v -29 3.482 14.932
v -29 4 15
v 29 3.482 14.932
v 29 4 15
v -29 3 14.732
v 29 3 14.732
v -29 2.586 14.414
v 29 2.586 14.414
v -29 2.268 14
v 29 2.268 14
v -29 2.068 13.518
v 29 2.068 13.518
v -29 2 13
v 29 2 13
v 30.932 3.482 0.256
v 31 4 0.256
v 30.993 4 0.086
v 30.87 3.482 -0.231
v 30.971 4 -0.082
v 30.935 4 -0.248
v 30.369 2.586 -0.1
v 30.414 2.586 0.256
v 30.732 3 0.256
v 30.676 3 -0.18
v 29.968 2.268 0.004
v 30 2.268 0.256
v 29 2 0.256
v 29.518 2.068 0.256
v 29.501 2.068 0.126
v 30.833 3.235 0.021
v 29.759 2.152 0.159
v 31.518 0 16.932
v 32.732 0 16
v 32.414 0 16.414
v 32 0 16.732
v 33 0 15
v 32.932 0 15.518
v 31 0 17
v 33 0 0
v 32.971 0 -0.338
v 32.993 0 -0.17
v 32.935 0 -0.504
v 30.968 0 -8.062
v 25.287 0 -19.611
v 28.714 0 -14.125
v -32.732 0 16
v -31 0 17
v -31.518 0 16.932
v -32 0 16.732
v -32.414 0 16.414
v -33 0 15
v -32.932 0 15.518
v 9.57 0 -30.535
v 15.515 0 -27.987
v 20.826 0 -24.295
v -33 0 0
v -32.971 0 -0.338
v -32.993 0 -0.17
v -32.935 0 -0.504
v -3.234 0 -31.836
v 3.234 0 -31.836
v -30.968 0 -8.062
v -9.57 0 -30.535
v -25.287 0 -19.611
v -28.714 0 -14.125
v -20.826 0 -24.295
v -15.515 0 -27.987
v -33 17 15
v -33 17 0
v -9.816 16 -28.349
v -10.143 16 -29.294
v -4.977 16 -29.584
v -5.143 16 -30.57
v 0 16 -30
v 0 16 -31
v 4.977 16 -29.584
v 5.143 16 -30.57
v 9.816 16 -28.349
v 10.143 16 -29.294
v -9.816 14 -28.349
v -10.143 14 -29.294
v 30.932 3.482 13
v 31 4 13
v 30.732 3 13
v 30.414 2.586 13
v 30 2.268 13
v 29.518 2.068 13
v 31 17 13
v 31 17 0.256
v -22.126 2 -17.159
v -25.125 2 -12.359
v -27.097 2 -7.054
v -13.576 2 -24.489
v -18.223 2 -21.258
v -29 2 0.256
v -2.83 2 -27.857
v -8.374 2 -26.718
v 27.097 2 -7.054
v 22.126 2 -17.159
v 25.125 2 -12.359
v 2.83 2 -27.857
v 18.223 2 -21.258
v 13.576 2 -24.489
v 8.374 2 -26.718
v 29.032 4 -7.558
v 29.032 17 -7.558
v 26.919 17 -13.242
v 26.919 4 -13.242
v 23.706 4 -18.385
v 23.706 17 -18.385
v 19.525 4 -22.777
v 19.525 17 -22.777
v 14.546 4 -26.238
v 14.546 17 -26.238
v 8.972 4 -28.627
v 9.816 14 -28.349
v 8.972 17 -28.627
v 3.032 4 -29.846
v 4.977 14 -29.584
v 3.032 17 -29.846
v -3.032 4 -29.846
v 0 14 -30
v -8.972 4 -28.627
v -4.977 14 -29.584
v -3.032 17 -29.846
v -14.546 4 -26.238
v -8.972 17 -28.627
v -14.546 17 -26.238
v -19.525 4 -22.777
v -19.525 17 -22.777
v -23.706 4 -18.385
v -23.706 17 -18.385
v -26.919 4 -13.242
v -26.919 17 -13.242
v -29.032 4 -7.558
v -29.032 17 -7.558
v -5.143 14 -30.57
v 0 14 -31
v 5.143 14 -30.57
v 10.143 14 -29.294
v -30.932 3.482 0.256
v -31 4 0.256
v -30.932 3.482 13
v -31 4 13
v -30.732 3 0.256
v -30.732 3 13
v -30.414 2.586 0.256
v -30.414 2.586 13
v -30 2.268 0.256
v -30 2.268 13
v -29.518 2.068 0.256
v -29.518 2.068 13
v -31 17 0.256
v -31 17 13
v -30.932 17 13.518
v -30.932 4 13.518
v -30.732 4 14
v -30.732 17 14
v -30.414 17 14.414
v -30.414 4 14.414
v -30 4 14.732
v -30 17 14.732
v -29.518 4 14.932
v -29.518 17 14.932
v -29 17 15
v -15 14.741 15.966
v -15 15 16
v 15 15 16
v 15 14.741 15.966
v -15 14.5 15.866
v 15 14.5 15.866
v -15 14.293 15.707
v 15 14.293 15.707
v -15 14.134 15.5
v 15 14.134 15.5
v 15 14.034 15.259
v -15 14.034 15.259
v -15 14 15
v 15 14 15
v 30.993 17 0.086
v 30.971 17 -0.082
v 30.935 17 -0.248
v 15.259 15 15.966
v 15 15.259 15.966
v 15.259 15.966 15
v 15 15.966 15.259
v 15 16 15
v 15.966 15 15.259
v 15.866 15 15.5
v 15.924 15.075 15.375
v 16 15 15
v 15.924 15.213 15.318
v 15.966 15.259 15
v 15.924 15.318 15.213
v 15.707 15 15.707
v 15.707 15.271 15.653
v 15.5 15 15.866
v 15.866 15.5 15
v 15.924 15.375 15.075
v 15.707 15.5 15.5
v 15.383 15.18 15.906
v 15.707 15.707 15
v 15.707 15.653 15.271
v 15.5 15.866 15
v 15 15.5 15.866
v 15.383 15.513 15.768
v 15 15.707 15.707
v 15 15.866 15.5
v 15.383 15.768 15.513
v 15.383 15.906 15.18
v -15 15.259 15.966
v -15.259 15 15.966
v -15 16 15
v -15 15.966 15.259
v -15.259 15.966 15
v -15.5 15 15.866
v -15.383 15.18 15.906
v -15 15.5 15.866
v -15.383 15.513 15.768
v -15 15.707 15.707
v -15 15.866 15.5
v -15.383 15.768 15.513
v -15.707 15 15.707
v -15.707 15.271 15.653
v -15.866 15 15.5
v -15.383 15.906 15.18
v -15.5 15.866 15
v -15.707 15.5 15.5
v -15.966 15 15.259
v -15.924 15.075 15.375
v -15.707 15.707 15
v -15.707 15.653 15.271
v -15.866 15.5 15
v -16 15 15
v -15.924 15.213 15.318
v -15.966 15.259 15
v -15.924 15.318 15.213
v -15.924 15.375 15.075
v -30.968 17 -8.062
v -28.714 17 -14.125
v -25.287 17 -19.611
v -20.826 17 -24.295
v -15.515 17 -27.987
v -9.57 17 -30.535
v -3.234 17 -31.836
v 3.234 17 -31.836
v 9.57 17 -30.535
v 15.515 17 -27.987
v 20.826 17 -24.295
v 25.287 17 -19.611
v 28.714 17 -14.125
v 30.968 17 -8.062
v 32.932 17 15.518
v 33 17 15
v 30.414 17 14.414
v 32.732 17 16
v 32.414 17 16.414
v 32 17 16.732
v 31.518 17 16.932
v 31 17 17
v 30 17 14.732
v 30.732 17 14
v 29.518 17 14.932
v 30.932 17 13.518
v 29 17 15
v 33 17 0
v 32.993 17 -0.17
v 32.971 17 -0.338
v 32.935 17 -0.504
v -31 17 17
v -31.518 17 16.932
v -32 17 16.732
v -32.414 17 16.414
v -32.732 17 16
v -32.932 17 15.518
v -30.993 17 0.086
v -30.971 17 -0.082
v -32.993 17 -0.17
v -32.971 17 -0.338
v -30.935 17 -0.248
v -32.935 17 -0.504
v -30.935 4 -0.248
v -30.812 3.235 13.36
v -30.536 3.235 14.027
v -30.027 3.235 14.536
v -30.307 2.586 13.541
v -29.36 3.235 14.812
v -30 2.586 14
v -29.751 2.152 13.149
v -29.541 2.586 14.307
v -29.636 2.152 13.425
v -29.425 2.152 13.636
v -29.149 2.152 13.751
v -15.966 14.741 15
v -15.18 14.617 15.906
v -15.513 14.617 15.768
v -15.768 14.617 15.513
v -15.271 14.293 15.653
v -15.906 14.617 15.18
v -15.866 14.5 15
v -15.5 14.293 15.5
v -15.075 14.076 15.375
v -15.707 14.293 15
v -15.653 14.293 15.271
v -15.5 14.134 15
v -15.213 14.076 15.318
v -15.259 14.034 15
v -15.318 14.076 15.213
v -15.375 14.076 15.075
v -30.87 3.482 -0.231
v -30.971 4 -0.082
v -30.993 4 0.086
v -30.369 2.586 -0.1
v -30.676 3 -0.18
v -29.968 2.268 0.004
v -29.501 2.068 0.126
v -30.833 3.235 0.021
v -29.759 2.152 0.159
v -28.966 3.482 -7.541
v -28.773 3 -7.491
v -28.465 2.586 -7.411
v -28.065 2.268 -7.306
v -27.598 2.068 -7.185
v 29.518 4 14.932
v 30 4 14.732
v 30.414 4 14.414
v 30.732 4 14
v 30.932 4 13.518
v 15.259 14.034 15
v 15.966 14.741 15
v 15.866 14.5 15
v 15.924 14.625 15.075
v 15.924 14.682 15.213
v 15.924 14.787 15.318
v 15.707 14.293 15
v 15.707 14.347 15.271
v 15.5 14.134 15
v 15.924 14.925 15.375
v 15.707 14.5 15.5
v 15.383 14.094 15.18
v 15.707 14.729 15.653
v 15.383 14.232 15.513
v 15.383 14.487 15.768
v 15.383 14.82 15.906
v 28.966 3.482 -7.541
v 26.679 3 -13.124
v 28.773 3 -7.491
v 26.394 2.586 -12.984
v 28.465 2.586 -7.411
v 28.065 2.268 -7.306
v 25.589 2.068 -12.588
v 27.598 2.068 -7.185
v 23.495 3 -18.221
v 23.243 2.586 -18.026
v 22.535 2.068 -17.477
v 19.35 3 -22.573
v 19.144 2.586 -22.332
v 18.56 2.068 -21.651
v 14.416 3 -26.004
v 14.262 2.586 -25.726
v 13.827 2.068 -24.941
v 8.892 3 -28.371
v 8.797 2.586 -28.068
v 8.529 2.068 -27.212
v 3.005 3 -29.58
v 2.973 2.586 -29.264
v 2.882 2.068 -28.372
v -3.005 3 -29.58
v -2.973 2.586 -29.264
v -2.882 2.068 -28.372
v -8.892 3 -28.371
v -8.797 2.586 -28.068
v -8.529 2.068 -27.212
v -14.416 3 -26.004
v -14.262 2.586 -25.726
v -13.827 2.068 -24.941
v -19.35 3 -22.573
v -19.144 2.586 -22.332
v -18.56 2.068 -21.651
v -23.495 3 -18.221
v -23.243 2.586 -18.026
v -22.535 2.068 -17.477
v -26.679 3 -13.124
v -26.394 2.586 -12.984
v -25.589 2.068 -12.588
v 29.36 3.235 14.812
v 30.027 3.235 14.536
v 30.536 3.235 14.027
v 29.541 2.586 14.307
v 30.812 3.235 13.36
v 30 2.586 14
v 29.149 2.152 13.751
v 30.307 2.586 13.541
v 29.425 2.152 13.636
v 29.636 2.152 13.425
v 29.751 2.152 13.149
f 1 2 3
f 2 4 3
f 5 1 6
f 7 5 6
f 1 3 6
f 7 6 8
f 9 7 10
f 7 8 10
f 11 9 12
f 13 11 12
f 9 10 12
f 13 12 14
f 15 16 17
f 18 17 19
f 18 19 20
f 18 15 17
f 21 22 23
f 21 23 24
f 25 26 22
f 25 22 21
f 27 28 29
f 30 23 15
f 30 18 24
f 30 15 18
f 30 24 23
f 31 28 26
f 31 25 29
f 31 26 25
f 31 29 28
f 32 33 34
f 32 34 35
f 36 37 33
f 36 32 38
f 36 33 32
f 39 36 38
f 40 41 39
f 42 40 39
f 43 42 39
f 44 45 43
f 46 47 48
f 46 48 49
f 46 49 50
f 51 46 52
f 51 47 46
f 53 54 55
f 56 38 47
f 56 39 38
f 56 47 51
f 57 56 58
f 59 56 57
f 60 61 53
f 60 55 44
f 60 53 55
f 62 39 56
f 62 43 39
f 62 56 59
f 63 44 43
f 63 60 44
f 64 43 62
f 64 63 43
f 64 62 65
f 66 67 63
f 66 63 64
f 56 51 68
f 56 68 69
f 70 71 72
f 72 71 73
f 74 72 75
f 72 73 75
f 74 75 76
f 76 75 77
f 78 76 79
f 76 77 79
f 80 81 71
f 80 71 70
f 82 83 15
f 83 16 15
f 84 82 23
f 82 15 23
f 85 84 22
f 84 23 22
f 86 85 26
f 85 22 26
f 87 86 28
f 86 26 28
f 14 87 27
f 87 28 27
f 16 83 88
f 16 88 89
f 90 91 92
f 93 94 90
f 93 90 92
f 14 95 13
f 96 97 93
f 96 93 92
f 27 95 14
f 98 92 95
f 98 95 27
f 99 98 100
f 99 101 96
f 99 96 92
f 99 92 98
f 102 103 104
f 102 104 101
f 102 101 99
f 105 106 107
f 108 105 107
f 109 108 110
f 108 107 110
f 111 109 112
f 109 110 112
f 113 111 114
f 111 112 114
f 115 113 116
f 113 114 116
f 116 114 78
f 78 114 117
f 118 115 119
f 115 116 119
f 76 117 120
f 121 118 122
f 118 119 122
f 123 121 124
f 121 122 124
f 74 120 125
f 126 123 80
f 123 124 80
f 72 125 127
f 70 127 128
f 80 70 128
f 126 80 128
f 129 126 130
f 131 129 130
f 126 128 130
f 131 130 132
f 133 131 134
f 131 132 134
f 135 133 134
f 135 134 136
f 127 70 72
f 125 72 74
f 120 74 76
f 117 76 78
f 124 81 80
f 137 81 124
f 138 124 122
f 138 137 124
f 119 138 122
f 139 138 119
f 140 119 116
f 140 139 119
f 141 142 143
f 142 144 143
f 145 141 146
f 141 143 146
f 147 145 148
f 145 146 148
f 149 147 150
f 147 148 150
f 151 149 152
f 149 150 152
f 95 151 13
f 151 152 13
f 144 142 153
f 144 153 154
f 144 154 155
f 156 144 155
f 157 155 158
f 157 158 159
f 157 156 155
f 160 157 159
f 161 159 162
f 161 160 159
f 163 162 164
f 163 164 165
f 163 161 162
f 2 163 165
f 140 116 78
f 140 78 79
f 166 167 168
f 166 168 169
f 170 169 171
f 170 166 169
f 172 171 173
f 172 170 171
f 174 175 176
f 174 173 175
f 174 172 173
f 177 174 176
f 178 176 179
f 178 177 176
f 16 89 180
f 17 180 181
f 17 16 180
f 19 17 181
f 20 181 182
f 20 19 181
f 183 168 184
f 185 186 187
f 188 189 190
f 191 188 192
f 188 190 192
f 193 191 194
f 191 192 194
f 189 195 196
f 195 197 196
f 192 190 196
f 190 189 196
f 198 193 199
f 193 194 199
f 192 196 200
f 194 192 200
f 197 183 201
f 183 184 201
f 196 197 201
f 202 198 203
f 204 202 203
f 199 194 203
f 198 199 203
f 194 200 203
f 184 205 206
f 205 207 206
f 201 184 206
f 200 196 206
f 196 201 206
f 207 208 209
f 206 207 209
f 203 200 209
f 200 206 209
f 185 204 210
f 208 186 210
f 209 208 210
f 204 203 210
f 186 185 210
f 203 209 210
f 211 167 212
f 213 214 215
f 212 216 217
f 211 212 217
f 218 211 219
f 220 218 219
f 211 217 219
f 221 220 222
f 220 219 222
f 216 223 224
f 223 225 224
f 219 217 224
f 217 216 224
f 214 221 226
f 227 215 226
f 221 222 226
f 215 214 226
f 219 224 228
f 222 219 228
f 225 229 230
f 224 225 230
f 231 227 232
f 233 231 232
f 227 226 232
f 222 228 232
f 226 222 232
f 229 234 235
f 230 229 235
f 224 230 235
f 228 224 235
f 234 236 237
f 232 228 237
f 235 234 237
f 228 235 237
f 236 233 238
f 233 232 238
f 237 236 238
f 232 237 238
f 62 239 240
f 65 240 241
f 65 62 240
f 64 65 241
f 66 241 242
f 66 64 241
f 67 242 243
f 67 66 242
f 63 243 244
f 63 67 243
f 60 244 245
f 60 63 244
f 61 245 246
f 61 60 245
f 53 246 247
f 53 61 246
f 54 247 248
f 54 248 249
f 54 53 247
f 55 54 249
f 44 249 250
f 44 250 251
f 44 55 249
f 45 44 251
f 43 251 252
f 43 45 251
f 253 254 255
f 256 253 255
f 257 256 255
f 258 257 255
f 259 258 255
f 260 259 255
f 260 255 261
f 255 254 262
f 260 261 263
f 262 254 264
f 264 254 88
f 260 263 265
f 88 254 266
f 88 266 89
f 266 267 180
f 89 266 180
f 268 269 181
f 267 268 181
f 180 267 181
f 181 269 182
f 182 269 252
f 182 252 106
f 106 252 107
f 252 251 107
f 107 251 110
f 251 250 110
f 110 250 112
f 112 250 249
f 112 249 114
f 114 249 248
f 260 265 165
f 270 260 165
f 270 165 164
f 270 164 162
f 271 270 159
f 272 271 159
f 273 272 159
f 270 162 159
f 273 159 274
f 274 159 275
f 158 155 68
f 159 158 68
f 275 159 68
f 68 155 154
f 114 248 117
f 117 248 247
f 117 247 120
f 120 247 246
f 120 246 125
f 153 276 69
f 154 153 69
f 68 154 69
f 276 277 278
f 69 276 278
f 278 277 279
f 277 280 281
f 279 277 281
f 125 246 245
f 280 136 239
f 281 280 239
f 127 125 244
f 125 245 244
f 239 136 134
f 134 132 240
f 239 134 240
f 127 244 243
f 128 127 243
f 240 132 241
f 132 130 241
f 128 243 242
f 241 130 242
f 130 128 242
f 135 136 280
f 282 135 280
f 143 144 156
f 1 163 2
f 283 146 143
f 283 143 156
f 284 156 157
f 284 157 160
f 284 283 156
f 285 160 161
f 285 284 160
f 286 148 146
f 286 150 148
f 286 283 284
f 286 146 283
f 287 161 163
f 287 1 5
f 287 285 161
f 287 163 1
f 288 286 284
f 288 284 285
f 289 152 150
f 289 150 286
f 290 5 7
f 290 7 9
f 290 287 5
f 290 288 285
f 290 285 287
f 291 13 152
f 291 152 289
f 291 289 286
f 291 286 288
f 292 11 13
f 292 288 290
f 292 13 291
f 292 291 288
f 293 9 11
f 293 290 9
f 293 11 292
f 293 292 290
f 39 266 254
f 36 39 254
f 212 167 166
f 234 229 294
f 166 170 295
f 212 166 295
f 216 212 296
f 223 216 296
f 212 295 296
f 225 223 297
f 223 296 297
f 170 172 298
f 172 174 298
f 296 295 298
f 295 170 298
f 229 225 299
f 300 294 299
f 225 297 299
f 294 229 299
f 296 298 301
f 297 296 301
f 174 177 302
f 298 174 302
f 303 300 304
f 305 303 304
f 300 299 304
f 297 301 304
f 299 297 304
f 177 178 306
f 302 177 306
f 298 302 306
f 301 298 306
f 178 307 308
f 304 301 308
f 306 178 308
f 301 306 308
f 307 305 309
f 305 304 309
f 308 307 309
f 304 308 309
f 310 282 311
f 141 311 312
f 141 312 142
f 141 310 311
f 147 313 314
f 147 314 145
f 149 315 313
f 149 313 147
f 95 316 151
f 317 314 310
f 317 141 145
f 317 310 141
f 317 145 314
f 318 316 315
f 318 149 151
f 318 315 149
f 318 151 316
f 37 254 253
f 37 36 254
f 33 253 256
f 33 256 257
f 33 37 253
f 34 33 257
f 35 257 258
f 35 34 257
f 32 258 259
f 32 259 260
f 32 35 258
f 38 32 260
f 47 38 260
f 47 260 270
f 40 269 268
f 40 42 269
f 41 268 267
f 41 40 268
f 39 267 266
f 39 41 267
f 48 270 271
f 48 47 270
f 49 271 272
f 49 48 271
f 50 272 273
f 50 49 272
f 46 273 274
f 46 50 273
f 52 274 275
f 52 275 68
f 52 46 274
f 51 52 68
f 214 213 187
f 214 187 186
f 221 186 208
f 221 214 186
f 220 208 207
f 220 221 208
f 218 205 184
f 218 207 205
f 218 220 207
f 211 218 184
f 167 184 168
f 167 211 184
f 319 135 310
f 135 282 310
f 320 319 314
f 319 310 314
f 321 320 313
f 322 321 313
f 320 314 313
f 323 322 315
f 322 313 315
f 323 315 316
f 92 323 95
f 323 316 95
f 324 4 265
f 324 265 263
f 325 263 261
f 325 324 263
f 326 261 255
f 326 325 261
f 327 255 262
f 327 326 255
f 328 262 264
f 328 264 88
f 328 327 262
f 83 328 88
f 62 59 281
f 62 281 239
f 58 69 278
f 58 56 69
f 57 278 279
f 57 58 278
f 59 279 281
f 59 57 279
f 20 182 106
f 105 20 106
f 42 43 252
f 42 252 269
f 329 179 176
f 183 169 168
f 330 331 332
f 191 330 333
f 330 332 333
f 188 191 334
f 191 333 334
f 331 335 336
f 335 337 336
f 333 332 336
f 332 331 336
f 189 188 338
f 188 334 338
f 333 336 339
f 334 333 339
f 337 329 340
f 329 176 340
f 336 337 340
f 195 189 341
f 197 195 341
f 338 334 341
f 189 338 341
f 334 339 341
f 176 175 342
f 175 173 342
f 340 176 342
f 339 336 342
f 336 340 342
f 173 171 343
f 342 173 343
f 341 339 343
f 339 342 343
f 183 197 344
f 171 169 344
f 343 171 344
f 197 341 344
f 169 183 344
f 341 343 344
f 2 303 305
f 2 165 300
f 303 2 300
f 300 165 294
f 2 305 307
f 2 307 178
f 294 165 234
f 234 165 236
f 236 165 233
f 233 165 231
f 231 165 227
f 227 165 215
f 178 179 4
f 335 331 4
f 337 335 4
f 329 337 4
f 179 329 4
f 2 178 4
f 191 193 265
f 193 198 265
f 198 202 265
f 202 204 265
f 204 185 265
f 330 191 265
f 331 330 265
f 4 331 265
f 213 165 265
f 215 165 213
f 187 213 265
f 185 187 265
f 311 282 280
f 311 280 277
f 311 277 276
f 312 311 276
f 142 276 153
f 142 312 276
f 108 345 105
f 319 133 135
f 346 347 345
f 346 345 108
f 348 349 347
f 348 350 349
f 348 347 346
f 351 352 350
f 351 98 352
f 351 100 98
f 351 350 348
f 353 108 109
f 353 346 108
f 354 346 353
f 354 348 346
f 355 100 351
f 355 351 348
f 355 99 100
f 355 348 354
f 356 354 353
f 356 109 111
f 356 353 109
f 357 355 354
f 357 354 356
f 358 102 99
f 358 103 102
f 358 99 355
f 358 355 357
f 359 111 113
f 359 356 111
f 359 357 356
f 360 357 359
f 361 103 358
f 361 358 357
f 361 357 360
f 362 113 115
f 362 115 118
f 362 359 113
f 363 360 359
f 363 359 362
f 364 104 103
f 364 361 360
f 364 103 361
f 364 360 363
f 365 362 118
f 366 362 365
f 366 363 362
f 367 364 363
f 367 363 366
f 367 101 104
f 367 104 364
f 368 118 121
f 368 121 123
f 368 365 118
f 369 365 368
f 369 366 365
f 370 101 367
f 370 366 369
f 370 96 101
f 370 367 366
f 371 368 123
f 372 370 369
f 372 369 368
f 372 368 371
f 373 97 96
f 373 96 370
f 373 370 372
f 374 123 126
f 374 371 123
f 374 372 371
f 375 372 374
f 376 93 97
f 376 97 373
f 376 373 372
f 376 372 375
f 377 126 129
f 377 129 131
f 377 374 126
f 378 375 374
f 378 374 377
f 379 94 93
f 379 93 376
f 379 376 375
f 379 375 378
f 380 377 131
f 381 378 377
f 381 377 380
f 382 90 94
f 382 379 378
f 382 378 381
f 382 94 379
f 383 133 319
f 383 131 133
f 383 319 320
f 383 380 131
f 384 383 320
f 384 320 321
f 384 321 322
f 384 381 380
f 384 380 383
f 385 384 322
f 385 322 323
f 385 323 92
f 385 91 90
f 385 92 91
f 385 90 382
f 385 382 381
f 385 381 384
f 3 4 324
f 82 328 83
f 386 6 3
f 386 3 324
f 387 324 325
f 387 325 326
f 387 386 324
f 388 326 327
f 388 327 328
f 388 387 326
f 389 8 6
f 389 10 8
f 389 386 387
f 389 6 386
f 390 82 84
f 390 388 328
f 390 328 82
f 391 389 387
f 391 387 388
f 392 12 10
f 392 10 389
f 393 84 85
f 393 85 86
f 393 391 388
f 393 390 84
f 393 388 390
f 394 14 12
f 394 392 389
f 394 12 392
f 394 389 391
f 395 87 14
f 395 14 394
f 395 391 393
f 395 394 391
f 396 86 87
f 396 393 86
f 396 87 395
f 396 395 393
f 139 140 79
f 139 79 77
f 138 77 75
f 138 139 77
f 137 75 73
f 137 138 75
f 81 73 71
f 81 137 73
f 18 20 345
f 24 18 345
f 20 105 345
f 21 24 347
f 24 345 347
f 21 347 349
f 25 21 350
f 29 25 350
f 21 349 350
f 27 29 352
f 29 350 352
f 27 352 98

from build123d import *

# Parameters (mm, degrees)
BOSS_EXTRUDE1_DEPTH = 17
SKETCH4_OUTSIDE_W   = 84.788
SKETCH4_OUTSIDE_H   = 67.788
CUT_EXTRUDE1_DEPTH  = 15
FILLET4_R           = 2
FILLET5_R           = 2
SKETCH9_W           = 32
SKETCH9_H           = 2
CUT_EXTRUDE2_DEPTH  = 1
FILLET6_R           = 1
WRAP5_START         = 14
WRAP5_DEPTH         = 2


# Read off the part's stored shape, not the designer's step: Wrap5
with BuildPart() as part:
    # Sketch2 → Boss-Extrude1 (new body)
    with BuildSketch(Plane(origin=(0, 0, 0), x_dir=(1, 0, 0), z_dir=(0, 1, 0))):
        with BuildLine():
            Line((30.967741935, 8.062193214), (33, 0.25607376))
            Line((33, 0.25607376), (33, -17))
            Line((33, -17), (-33, -17))
            Line((-33, -17), (-33, 0.25607376))
            Line((-33, 0.25607376), (-30.967741935, 8.062193214))
            ThreePointArc((-30.967741935, 8.062193214), (0, 32), (30.967741935, 8.062193214))
        make_face()
    extrude(amount=BOSS_EXTRUDE1_DEPTH)

    # Sketch4 outside → Cut-Extrude1 (cut)
    # profile 1 of 2: a face of its own
    with BuildSketch(Plane(origin=(0, 17, 0), x_dir=(1, 0, 0), z_dir=(0, 1, 0))):
        with Locations((0, 7.5)):
            Rectangle(SKETCH4_OUTSIDE_W, SKETCH4_OUTSIDE_H)
        with BuildLine():
            Line((33, -17), (33, 0.25607376))
            Line((33, 0.25607376), (30.967741935, 8.062193214))
            ThreePointArc((30.967741935, 8.062193214), (0, 32), (-30.967741935, 8.062193214))
            Line((-30.967741935, 8.062193214), (-33, 0.25607376))
            Line((-33, 0.25607376), (-33, -17))
            Line((-33, -17), (33, -17))
        make_face(mode=Mode.SUBTRACT)
    # profile 2 of 2: a face of its own
    with BuildSketch(Plane(origin=(0, 17, 0), x_dir=(1, 0, 0), z_dir=(0, 1, 0))):
        with BuildLine():
            Line((-29.032258065, 7.558306138), (-31, 0))
            Line((-31, 0), (-31, -15))
            Line((-31, -15), (31, -15))
            Line((31, -15), (31, 0))
            Line((31, 0), (29.032258065, 7.558306138))
            ThreePointArc((29.032258065, 7.558306138), (0, 30), (-29.032258065, 7.558306138))
        make_face()
    extrude(amount=-CUT_EXTRUDE1_DEPTH, mode=Mode.SUBTRACT)

    # Fillet4
    fillet4_edges = [part.edges().sort_by_distance(p)[0] for p in [
        (33, 8.5, -0.25607376),
        (33, 8.5, 17),
        (-33, 8.5, 17),
        (-33, 8.5, -0.25607376),
        (31, 9.5, 0),
        (31, 9.5, 15),
        (-31, 9.5, 15),
        (-31, 9.5, 0),
    ]]
    fillet(fillet4_edges, radius=FILLET4_R)

    # Fillet5
    fillet5_edges = [part.edges().sort_by_distance(p)[0] for p in [
        (0, 2, -30),
        (-29.983870968, 2, -3.903059727),
        (0, 2, 15),
        (-31, 2, 6.62803688),
        (31, 2, 6.62803688),
        (29.983870968, 2, -3.903059727),
        (-30.983805401, 2, 0.002073506),
        (30.983805401, 2, 0.002073506),
        (30.414213562, 2, 14.414213562),
        (-30.414213562, 2, 14.414213562),
    ]]
    fillet(fillet5_edges, radius=FILLET5_R)

    # Sketch9 → Cut-Extrude2 (cut)
    with BuildSketch(Plane(origin=(0, 0, 15), x_dir=(-1, 0, 0), z_dir=(0, 0, -1))):
        with Locations((0, 15)):
            Rectangle(SKETCH9_W, SKETCH9_H)
    extrude(amount=-CUT_EXTRUDE2_DEPTH, mode=Mode.SUBTRACT)

    # Fillet6
    fillet6_edges = [part.edges().sort_by_distance(p)[0] for p in [
        (0, 16, 16),
    ]]
    fillet(fillet6_edges, radius=FILLET6_R - 0.0001)  # a hair under: the kernel refuses the full size
    fillet6_2_edges = [part.edges().sort_by_distance(p)[0] for p in [
        (-16, 14.50005, 16),
    ]]
    fillet(fillet6_2_edges, radius=FILLET6_R - 0.0001)  # a hair under: the kernel refuses the full size
    fillet6_3_edges = [part.edges().sort_by_distance(p)[0] for p in [
        (0.49995, 14, 16),
    ]]
    fillet(fillet6_3_edges, radius=FILLET6_R - 0.0001)  # a hair under: the kernel refuses the full size
    fillet6_4_edges = [part.edges().sort_by_distance(p)[0] for p in [
        (16, 15, 16),
    ]]
    fillet(fillet6_4_edges, radius=FILLET6_R - 0.0001)  # a hair under: the kernel refuses the full size

    # Wrap5 outline → Wrap5 (cut)
    with BuildSketch(Plane(origin=(0, 0, 0), x_dir=(1, 0, 0), z_dir=(0, 1, 0)).offset(WRAP5_START)):
        with BuildLine():
            Line((9.815840904, 28.348708389), (10.143035601, 29.293665336))
            ThreePointArc((10.143035601, 29.293665336), (0, 31), (-10.143035601, 29.293665336))
            Line((-10.143035601, 29.293665336), (-9.815840904, 28.348708389))
            ThreePointArc((-9.815840904, 28.348708389), (0, 30), (9.815840904, 28.348708389))
        make_face()
    extrude(amount=WRAP5_DEPTH, mode=Mode.SUBTRACT)


solid = part.part
